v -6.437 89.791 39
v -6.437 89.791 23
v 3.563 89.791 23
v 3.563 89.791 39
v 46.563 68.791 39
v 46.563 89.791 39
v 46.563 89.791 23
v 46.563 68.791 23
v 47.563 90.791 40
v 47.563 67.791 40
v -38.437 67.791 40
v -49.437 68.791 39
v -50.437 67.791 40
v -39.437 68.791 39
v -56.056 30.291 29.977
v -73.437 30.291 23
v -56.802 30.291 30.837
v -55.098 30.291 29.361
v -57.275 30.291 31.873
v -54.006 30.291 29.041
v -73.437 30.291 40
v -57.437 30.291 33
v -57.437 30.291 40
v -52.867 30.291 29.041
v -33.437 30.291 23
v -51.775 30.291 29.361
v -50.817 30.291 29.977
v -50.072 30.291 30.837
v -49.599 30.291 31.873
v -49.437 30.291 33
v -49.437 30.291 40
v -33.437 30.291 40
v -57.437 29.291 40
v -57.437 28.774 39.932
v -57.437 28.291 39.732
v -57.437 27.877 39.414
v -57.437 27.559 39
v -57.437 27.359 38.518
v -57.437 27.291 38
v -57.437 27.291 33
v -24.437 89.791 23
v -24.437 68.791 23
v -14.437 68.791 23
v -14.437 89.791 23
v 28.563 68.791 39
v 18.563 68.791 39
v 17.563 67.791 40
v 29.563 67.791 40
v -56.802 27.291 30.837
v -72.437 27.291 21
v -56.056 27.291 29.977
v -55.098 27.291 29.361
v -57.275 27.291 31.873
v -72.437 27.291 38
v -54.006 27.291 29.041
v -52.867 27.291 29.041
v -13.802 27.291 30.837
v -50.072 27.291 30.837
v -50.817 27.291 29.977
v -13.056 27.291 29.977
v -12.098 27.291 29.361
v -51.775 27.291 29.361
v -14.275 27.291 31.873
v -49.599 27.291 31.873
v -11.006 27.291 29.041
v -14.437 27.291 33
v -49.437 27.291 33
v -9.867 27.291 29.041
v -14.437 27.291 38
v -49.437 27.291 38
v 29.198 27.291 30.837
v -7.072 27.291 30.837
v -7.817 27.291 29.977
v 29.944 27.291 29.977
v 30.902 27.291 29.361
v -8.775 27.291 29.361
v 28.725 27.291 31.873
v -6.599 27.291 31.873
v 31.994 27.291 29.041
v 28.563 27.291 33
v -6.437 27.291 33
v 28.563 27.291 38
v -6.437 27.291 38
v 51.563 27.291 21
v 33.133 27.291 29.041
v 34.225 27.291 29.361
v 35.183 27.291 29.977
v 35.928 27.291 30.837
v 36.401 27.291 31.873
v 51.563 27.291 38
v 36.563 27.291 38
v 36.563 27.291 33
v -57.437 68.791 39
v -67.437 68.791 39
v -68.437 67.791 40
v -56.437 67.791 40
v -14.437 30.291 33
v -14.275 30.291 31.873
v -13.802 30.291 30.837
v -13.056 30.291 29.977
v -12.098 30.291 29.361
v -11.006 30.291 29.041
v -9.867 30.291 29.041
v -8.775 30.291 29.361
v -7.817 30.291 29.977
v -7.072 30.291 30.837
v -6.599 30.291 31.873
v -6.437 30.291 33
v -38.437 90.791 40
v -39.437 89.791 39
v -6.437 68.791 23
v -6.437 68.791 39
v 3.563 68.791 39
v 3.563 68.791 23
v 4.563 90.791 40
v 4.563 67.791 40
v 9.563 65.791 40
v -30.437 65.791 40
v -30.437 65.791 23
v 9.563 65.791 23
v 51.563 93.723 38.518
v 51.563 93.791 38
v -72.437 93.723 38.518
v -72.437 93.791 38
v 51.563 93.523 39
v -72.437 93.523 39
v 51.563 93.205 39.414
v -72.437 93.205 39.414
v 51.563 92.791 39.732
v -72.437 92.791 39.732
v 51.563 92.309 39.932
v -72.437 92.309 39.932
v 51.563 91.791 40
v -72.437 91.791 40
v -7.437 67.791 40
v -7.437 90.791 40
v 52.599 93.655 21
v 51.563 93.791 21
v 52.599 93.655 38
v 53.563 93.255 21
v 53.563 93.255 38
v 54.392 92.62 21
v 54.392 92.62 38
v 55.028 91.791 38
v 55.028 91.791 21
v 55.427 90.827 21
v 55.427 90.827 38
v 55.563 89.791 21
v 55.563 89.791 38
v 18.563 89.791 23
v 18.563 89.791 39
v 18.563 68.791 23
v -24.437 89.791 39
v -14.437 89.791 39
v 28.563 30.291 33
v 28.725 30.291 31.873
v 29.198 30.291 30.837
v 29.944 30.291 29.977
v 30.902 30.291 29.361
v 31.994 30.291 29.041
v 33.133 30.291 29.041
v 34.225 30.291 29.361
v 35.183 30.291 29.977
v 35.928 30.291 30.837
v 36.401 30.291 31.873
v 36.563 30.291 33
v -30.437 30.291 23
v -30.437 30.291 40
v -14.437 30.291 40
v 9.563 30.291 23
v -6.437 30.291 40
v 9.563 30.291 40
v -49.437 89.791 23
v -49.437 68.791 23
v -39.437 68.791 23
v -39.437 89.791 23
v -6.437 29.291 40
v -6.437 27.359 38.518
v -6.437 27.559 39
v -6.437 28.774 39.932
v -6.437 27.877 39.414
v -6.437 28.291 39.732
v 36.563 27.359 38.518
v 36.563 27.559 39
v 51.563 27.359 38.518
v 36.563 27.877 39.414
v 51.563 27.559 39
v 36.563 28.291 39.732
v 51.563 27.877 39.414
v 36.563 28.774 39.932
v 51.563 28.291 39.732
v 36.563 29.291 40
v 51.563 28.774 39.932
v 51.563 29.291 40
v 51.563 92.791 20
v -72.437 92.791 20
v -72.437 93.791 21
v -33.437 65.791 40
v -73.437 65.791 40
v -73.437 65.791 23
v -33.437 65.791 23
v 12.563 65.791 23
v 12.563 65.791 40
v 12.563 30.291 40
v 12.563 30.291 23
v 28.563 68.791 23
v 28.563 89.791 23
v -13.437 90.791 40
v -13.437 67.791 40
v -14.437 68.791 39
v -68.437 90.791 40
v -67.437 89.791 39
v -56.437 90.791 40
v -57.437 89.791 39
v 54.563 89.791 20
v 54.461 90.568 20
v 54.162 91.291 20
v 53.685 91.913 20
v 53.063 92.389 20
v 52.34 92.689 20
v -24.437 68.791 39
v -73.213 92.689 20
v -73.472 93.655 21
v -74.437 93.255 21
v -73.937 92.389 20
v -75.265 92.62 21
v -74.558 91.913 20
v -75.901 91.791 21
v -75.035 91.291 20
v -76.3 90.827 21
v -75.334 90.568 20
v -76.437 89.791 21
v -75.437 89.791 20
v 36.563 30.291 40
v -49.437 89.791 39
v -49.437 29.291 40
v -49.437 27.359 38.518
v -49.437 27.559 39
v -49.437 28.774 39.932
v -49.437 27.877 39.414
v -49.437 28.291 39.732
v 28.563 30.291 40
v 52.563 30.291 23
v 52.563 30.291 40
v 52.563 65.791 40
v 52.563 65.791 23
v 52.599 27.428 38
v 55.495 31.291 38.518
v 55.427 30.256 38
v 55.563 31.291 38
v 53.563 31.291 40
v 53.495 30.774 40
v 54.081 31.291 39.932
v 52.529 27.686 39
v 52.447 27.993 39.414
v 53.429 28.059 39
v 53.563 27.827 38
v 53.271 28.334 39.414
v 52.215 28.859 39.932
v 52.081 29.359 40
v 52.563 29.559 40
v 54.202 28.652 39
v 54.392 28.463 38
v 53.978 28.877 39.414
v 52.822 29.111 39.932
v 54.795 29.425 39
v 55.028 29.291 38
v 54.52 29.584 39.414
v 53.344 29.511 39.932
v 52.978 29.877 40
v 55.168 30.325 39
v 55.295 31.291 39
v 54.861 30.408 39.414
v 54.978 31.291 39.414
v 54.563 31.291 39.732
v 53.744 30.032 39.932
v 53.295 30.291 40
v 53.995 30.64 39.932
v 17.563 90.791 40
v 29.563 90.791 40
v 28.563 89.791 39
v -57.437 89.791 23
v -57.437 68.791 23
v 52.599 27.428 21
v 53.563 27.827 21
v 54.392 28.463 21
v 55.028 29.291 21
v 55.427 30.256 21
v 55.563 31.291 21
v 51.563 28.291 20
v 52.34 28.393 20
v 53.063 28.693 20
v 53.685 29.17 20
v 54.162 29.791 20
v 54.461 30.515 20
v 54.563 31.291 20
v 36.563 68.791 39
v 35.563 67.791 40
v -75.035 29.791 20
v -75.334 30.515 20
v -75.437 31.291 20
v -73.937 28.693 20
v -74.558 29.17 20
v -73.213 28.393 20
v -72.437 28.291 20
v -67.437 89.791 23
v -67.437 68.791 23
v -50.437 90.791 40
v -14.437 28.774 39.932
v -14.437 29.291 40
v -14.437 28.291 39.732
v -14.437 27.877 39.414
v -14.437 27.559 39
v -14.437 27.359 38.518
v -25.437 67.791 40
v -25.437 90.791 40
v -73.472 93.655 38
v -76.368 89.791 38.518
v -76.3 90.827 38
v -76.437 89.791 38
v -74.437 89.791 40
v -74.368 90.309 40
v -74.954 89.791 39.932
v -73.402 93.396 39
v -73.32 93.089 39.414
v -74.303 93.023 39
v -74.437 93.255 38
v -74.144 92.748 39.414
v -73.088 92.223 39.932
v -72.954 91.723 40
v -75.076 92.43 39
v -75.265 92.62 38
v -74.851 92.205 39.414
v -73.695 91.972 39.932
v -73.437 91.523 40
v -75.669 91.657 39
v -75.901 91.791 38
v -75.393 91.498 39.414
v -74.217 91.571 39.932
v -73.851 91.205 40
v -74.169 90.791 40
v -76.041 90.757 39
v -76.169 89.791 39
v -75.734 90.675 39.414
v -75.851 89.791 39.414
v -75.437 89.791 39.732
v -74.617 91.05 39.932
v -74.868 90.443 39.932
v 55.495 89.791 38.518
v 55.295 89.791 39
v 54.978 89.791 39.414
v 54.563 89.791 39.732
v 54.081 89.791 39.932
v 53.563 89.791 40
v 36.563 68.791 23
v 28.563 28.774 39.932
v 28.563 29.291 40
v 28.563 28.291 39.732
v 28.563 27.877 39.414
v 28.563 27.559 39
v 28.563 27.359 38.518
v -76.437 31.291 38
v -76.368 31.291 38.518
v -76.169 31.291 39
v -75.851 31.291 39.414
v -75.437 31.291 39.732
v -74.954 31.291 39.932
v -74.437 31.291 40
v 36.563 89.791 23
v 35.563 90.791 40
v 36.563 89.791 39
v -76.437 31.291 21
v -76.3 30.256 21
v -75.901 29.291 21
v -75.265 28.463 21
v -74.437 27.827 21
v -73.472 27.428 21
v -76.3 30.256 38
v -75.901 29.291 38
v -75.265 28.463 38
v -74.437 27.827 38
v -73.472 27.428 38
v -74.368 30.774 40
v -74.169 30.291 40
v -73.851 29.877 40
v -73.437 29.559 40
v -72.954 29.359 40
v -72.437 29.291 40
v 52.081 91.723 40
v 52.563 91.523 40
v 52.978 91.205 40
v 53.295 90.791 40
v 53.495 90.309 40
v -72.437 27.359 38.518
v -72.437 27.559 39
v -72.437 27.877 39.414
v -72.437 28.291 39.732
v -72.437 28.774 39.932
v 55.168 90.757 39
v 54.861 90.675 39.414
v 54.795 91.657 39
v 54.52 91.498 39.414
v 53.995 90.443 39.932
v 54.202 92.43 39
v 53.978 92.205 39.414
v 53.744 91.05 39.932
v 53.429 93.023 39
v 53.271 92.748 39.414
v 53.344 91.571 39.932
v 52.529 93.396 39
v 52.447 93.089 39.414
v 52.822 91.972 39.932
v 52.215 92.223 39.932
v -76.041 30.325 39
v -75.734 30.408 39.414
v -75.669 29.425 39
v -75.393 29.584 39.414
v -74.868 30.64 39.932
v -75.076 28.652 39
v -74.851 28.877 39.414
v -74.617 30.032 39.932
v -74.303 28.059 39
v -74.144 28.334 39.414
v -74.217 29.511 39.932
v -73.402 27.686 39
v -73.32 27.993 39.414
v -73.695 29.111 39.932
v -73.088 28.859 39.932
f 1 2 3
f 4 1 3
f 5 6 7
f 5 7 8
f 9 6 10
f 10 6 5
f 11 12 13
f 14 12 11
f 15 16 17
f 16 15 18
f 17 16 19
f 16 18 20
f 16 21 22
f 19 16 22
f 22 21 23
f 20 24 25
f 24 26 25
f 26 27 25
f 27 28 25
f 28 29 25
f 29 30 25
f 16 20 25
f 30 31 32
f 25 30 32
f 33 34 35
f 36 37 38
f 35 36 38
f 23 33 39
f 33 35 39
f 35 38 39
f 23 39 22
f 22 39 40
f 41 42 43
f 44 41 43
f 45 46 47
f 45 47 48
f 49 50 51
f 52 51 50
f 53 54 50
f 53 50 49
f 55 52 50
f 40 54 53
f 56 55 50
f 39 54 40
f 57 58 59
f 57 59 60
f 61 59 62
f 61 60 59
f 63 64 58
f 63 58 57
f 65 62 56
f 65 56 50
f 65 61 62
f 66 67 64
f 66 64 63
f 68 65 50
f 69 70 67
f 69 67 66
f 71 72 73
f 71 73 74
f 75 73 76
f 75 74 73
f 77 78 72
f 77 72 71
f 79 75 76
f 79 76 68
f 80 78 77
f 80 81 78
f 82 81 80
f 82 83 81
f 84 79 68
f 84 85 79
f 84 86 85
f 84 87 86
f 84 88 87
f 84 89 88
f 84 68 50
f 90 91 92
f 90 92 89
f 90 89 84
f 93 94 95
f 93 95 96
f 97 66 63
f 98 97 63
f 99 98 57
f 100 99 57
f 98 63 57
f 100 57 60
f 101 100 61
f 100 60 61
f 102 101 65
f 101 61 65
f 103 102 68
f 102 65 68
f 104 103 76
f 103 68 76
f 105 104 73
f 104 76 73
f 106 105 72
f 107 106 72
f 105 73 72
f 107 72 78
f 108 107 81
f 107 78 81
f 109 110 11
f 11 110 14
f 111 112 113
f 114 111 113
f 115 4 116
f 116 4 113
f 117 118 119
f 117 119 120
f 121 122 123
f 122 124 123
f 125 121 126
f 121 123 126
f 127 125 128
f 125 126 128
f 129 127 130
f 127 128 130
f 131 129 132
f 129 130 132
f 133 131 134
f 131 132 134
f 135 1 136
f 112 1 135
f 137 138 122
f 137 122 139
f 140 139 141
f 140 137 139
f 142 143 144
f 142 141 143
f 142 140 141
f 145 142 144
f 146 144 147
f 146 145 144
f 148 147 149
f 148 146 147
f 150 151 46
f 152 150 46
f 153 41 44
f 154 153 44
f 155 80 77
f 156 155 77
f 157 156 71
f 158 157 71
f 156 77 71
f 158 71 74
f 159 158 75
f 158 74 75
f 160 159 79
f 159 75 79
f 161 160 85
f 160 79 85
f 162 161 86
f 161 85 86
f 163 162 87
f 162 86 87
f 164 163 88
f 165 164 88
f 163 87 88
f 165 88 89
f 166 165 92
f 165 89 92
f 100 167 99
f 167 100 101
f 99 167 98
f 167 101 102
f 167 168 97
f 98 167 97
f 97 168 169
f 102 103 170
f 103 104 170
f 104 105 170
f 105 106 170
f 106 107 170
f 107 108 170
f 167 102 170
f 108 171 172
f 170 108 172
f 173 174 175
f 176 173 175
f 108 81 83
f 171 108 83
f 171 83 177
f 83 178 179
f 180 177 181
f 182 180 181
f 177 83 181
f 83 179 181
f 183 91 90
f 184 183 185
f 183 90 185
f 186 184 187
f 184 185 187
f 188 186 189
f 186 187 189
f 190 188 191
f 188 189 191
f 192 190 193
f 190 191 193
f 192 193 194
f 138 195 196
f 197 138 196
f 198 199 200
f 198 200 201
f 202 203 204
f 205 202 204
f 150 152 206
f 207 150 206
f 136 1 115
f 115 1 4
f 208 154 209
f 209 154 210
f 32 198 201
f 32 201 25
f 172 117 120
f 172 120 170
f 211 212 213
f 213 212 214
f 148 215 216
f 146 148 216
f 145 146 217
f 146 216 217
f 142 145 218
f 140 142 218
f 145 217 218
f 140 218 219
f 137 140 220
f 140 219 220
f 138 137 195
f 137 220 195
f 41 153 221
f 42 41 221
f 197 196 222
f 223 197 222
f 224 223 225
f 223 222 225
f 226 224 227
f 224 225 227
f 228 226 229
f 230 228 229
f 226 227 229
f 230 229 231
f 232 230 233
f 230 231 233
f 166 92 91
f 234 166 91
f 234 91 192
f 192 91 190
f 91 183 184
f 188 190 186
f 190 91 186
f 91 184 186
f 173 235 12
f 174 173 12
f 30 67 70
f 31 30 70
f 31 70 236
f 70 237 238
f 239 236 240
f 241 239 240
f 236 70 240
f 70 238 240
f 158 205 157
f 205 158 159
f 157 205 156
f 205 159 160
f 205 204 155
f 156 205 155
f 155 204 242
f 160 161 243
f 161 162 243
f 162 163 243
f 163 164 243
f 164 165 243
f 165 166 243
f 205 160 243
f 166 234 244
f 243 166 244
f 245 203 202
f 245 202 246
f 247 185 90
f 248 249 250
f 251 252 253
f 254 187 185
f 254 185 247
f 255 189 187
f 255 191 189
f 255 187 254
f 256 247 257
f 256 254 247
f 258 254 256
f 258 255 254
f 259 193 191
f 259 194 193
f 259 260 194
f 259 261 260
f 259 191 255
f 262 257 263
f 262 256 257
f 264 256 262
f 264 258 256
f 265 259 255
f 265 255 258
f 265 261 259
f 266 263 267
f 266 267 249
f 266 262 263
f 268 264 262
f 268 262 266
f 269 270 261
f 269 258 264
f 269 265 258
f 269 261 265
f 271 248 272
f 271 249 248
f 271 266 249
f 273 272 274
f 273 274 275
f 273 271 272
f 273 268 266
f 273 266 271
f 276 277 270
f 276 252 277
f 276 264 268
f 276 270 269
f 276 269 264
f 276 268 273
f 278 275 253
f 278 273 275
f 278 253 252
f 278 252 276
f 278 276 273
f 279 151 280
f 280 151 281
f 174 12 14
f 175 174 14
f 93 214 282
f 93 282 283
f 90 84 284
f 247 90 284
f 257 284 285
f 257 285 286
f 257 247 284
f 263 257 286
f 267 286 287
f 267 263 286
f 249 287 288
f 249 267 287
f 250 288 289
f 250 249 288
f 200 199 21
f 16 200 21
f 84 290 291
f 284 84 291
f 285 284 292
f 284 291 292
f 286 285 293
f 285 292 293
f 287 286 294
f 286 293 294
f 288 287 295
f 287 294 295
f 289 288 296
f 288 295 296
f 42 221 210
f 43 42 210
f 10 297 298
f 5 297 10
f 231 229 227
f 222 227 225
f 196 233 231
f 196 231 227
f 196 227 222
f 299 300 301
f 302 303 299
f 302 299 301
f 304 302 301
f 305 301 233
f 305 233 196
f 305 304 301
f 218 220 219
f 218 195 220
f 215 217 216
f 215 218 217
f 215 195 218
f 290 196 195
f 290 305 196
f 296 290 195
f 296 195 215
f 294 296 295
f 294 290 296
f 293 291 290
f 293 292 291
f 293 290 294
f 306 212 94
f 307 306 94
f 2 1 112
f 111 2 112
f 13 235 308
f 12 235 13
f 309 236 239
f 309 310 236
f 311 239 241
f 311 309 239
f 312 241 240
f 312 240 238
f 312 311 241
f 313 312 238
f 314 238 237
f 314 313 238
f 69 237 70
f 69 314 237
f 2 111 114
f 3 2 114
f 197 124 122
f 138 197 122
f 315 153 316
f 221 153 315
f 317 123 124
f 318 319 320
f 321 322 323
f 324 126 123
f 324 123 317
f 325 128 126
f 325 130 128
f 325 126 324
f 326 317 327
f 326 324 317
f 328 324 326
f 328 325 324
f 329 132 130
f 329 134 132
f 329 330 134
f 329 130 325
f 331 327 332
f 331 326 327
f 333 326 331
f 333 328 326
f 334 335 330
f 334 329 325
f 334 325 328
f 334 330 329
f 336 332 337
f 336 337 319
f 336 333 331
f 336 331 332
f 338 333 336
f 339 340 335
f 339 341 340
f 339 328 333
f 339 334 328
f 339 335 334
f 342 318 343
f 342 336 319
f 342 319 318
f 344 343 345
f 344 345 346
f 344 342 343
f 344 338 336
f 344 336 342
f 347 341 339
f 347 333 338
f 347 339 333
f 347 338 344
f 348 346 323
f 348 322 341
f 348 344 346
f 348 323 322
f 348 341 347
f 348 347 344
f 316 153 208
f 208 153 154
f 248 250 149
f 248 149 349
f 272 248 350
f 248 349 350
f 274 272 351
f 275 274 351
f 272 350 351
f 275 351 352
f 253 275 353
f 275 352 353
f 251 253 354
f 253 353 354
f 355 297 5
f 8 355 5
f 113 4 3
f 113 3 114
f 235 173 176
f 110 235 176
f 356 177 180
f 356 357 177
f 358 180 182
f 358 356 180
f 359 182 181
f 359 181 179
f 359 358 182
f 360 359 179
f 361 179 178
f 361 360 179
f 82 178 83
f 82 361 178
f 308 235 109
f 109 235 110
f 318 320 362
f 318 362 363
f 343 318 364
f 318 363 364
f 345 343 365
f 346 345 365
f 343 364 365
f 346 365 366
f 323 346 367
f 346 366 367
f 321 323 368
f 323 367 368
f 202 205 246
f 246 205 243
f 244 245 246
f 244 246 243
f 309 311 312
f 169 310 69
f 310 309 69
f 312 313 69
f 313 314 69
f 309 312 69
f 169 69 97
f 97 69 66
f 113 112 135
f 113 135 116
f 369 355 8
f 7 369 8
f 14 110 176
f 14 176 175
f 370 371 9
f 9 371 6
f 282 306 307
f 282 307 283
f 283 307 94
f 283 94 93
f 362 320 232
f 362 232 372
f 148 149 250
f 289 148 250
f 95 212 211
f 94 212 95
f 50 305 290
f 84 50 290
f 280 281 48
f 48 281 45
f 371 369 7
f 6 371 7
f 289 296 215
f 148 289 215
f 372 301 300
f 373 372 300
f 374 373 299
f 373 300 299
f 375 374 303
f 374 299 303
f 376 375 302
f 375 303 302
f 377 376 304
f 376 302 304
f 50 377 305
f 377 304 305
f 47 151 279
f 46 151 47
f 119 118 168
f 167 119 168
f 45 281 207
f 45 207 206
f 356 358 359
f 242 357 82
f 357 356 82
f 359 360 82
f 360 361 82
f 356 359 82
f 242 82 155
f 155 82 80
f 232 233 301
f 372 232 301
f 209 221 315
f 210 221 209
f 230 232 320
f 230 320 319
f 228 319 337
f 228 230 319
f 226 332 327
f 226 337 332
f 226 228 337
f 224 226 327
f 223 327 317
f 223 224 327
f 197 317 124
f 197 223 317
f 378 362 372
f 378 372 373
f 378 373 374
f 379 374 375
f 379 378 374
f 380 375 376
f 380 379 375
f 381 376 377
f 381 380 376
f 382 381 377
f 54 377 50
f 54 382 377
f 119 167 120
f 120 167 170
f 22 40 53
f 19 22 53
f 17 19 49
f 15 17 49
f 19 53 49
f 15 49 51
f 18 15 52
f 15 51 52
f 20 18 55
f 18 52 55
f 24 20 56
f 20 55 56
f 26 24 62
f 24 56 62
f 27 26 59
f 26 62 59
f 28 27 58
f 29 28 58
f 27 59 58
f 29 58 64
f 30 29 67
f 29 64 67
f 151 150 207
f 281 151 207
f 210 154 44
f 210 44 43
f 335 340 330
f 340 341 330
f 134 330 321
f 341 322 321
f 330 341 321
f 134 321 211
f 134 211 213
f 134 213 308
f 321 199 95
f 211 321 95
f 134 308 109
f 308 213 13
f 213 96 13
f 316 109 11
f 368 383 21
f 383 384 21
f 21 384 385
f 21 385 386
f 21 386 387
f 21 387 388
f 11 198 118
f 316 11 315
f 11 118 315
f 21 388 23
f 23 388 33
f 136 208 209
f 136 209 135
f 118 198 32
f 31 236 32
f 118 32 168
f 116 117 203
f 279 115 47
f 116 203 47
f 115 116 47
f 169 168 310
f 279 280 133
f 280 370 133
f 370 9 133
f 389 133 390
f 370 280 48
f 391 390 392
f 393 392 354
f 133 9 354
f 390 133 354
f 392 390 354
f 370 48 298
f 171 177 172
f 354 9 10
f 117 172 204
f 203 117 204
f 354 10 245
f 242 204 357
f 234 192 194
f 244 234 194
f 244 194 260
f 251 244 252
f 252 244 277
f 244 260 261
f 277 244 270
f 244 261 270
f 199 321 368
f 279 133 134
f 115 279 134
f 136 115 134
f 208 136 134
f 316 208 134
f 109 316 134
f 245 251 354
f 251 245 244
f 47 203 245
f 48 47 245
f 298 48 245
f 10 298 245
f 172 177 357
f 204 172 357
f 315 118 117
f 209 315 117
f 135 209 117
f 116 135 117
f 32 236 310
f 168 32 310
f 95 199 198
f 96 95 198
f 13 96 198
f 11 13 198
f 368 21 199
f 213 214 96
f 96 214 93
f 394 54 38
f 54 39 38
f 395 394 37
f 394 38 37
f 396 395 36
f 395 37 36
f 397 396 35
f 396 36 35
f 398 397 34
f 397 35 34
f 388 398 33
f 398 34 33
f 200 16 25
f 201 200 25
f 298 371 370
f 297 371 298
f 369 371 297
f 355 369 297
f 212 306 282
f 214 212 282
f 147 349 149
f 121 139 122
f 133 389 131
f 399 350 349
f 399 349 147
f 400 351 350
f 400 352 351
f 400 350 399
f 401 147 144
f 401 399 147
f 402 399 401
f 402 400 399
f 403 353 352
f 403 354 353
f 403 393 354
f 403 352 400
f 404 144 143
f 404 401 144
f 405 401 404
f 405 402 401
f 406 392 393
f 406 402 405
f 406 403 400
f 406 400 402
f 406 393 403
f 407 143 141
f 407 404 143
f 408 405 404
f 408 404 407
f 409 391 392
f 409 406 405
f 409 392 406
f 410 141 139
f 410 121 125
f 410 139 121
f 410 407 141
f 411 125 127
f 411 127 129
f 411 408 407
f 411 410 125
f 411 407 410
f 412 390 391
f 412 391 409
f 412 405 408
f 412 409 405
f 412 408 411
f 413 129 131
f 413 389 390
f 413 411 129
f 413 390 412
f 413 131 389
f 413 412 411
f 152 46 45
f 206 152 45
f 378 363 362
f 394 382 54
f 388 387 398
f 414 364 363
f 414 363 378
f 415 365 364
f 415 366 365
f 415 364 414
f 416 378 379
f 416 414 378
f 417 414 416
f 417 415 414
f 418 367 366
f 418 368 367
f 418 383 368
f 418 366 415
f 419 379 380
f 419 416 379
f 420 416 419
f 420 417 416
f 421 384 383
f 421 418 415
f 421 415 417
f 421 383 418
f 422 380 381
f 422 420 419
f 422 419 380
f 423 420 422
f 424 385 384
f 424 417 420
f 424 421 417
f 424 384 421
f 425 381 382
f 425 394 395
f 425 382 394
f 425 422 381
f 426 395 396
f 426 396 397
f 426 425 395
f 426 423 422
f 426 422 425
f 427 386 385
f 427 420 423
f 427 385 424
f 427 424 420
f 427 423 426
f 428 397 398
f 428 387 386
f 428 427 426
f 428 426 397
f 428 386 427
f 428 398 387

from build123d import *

# Parameters (mm, degrees)
F0_W     = 132
F0_H     = 66.5
F0_W_2   = 10
F0_H_2   = 21
F0_W_3   = 40
F0_H_3   = 35.5
F1_DEPTH = 17
F2_W     = 132
F2_H     = 66.5
F2_W_2   = 10
F2_H_2   = 21
F2_W_3   = 40
F2_H_3   = 35.5
F3_DEPTH = 3
F5_DEPTH = 3
F6_ANGLE = 180
F7_R     = 4
F8_R     = 2
F9_SIZE  = 1
F10_SIZE = 1


with BuildPart() as f1:
    # F0 (on Top) → F1 (new body)
    with BuildSketch(Plane.XY):
        with Locations((-10.436555624, -5.9587561041)):
            Rectangle(F0_W, F0_H)
        with Locations((-62.436555624, -24.7087561041)):
            Rectangle(F0_W_2, F0_H_2, mode=Mode.SUBTRACT)
        with Locations((-44.436555624, -24.7087561041)):
            Rectangle(F0_W_2, F0_H_2, mode=Mode.SUBTRACT)
        with Locations((-19.436555624, -24.7087561041)):
            Rectangle(F0_W_2, F0_H_2, mode=Mode.SUBTRACT)
        with Locations((-1.436555624, -24.7087561041)):
            Rectangle(F0_W_2, F0_H_2, mode=Mode.SUBTRACT)
        with Locations((23.563444376, -24.7087561041)):
            Rectangle(F0_W_2, F0_H_2, mode=Mode.SUBTRACT)
        with Locations((41.563444376, -24.7087561041)):
            Rectangle(F0_W_2, F0_H_2, mode=Mode.SUBTRACT)
        with Locations((-53.436555624, 6.5412438959)):
            Rectangle(F0_W_3, F0_H_3, mode=Mode.SUBTRACT)
        with Locations((-10.436555624, 6.5412438959)):
            Rectangle(F0_W_3, F0_H_3, mode=Mode.SUBTRACT)
        with Locations((32.563444376, 6.5412438959)):
            Rectangle(F0_W_3, F0_H_3, mode=Mode.SUBTRACT)
    extrude(amount=F1_DEPTH)

    # F2 (on face) → F3 (join)
    with BuildSketch(Plane.XY.offset(17)):
        with Locations((-10.436555624, -5.9587561041)):
            Rectangle(F2_W, F2_H)
        with Locations((-62.436555624, -24.7087561041)):
            Rectangle(F2_W_2, F2_H_2, mode=Mode.SUBTRACT)
        with Locations((-44.436555624, -24.7087561041)):
            Rectangle(F2_W_2, F2_H_2, mode=Mode.SUBTRACT)
        with Locations((-19.436555624, -24.7087561041)):
            Rectangle(F2_W_2, F2_H_2, mode=Mode.SUBTRACT)
        with Locations((-1.436555624, -24.7087561041)):
            Rectangle(F2_W_2, F2_H_2, mode=Mode.SUBTRACT)
        with Locations((23.563444376, -24.7087561041)):
            Rectangle(F2_W_2, F2_H_2, mode=Mode.SUBTRACT)
        with Locations((41.563444376, -24.7087561041)):
            Rectangle(F2_W_2, F2_H_2, mode=Mode.SUBTRACT)
        with Locations((-53.436555624, 6.5412438959)):
            Rectangle(F2_W_3, F2_H_3, mode=Mode.SUBTRACT)
        with Locations((-10.436555624, 6.5412438959)):
            Rectangle(F2_W_3, F2_H_3, mode=Mode.SUBTRACT)
        with Locations((32.563444376, 6.5412438959)):
            Rectangle(F2_W_3, F2_H_3, mode=Mode.SUBTRACT)
        with Locations((-53.436555624, 6.5412438959)):
            Rectangle(F2_W_3, F2_H_3)
        with Locations((-10.436555624, 6.5412438959)):
            Rectangle(F2_W_3, F2_H_3)
        with Locations((32.563444376, 6.5412438959)):
            Rectangle(F2_W_3, F2_H_3)
        with Locations((41.563444376, -24.7087561041)):
            Rectangle(F2_W_2, F2_H_2)
        with Locations((23.563444376, -24.7087561041)):
            Rectangle(F2_W_2, F2_H_2)
        with Locations((-1.436555624, -24.7087561041)):
            Rectangle(F2_W_2, F2_H_2)
        with Locations((-19.436555624, -24.7087561041)):
            Rectangle(F2_W_2, F2_H_2)
        with Locations((-44.436555624, -24.7087561041)):
            Rectangle(F2_W_2, F2_H_2)
        with Locations((-62.436555624, -24.7087561041)):
            Rectangle(F2_W_2, F2_H_2)
    extrude(amount=F3_DEPTH)

    # F4 (on face) → F5 (cut, through all)
    with BuildSketch(Plane(origin=(0, 27.2912438959, 0), x_dir=(-1, 0, 0), z_dir=(0, 1, 0))):
        with BuildLine():
            Line((57.436555624, 0), (57.436555624, 7))
            ThreePointArc((57.436555624, 7), (53.436555624, 11), (49.436555624, 7))
            Line((49.436555624, 7), (49.436555624, 0))
            Line((49.436555624, 0), (57.436555624, 0))
        make_face()
        with BuildLine():
            Line((6.436555624, 0), (14.436555624, 0))
            Line((14.436555624, 0), (14.436555624, 7))
            ThreePointArc((14.436555624, 7), (10.436555624, 11), (6.436555624, 7))
            Line((6.436555624, 7), (6.436555624, 0))
        make_face()
        with BuildLine():
            Line((-36.563444376, 0), (-28.563444376, 0))
            Line((-28.563444376, 0), (-28.563444376, 7))
            ThreePointArc((-28.563444376, 7), (-32.563444376, 11), (-36.563444376, 7))
            Line((-36.563444376, 7), (-36.563444376, 0))
        make_face()
    extrude(amount=-F5_DEPTH, mode=Mode.SUBTRACT)


with BuildPart() as f1_1:
    # F6: moved
    add(f1.part.rotate(Axis((-10.436555624, 27.2912438959, 20), (1, 0, 0)), F6_ANGLE))

    # F7
    f7_edges = [f1_1.edges().sort_by_distance(p)[0] for p in [
        (-76.436556, 27.291244, 30),
        (55.563444, 27.291244, 30),
        (55.563444, 93.791244, 30),
        (-76.436556, 93.791244, 30),
    ]]
    fillet(f7_edges, radius=F7_R)

    # F8
    f8_edges = [f1_1.edges().sort_by_distance(p)[0] for p in [
        (-76.436556, 60.541244, 40),
        (-10.436556, 93.791244, 40),
        (-31.936556, 27.291244, 40),
        (11.063444, 27.291244, 40),
    ]]
    fillet(f8_edges, radius=F8_R)

    # F9
    f9_edges = [f1_1.edges().sort_by_distance(p)[0] for p in [
        (-67.436556, 79.291244, 40),
        (-39.436556, 79.291244, 40),
        (-49.436556, 79.291244, 40),
        (-62.436556, 68.791244, 40),
        (-57.436556, 79.291244, 40),
        (-24.436556, 79.291244, 40),
        (-14.436556, 79.291244, 40),
        (-6.436556, 79.291244, 40),
        (3.563444, 79.291244, 40),
        (18.563444, 79.291244, 40),
        (28.563444, 79.291244, 40),
        (36.563444, 79.291244, 40),
        (46.563444, 79.291244, 40),
        (41.563444, 68.791244, 40),
        (23.563444, 68.791244, 40),
        (-1.436556, 68.791244, 40),
        (-19.436556, 68.791244, 40),
        (-44.436556, 68.791244, 40),
        (-44.436556, 89.791244, 40),
        (-62.436556, 89.791244, 40),
        (-19.436556, 89.791244, 40),
        (-1.436556, 89.791244, 40),
        (23.563444, 89.791244, 40),
        (41.563444, 89.791244, 40),
    ]]
    chamfer(f9_edges, length=F9_SIZE)

    # F10
    f10_edges = [f1_1.edges().sort_by_distance(p)[0] for p in [
        (-10.436556, 27.291244, 20),
    ]]
    chamfer(f10_edges, length=F10_SIZE)


solid = f1_1.part
